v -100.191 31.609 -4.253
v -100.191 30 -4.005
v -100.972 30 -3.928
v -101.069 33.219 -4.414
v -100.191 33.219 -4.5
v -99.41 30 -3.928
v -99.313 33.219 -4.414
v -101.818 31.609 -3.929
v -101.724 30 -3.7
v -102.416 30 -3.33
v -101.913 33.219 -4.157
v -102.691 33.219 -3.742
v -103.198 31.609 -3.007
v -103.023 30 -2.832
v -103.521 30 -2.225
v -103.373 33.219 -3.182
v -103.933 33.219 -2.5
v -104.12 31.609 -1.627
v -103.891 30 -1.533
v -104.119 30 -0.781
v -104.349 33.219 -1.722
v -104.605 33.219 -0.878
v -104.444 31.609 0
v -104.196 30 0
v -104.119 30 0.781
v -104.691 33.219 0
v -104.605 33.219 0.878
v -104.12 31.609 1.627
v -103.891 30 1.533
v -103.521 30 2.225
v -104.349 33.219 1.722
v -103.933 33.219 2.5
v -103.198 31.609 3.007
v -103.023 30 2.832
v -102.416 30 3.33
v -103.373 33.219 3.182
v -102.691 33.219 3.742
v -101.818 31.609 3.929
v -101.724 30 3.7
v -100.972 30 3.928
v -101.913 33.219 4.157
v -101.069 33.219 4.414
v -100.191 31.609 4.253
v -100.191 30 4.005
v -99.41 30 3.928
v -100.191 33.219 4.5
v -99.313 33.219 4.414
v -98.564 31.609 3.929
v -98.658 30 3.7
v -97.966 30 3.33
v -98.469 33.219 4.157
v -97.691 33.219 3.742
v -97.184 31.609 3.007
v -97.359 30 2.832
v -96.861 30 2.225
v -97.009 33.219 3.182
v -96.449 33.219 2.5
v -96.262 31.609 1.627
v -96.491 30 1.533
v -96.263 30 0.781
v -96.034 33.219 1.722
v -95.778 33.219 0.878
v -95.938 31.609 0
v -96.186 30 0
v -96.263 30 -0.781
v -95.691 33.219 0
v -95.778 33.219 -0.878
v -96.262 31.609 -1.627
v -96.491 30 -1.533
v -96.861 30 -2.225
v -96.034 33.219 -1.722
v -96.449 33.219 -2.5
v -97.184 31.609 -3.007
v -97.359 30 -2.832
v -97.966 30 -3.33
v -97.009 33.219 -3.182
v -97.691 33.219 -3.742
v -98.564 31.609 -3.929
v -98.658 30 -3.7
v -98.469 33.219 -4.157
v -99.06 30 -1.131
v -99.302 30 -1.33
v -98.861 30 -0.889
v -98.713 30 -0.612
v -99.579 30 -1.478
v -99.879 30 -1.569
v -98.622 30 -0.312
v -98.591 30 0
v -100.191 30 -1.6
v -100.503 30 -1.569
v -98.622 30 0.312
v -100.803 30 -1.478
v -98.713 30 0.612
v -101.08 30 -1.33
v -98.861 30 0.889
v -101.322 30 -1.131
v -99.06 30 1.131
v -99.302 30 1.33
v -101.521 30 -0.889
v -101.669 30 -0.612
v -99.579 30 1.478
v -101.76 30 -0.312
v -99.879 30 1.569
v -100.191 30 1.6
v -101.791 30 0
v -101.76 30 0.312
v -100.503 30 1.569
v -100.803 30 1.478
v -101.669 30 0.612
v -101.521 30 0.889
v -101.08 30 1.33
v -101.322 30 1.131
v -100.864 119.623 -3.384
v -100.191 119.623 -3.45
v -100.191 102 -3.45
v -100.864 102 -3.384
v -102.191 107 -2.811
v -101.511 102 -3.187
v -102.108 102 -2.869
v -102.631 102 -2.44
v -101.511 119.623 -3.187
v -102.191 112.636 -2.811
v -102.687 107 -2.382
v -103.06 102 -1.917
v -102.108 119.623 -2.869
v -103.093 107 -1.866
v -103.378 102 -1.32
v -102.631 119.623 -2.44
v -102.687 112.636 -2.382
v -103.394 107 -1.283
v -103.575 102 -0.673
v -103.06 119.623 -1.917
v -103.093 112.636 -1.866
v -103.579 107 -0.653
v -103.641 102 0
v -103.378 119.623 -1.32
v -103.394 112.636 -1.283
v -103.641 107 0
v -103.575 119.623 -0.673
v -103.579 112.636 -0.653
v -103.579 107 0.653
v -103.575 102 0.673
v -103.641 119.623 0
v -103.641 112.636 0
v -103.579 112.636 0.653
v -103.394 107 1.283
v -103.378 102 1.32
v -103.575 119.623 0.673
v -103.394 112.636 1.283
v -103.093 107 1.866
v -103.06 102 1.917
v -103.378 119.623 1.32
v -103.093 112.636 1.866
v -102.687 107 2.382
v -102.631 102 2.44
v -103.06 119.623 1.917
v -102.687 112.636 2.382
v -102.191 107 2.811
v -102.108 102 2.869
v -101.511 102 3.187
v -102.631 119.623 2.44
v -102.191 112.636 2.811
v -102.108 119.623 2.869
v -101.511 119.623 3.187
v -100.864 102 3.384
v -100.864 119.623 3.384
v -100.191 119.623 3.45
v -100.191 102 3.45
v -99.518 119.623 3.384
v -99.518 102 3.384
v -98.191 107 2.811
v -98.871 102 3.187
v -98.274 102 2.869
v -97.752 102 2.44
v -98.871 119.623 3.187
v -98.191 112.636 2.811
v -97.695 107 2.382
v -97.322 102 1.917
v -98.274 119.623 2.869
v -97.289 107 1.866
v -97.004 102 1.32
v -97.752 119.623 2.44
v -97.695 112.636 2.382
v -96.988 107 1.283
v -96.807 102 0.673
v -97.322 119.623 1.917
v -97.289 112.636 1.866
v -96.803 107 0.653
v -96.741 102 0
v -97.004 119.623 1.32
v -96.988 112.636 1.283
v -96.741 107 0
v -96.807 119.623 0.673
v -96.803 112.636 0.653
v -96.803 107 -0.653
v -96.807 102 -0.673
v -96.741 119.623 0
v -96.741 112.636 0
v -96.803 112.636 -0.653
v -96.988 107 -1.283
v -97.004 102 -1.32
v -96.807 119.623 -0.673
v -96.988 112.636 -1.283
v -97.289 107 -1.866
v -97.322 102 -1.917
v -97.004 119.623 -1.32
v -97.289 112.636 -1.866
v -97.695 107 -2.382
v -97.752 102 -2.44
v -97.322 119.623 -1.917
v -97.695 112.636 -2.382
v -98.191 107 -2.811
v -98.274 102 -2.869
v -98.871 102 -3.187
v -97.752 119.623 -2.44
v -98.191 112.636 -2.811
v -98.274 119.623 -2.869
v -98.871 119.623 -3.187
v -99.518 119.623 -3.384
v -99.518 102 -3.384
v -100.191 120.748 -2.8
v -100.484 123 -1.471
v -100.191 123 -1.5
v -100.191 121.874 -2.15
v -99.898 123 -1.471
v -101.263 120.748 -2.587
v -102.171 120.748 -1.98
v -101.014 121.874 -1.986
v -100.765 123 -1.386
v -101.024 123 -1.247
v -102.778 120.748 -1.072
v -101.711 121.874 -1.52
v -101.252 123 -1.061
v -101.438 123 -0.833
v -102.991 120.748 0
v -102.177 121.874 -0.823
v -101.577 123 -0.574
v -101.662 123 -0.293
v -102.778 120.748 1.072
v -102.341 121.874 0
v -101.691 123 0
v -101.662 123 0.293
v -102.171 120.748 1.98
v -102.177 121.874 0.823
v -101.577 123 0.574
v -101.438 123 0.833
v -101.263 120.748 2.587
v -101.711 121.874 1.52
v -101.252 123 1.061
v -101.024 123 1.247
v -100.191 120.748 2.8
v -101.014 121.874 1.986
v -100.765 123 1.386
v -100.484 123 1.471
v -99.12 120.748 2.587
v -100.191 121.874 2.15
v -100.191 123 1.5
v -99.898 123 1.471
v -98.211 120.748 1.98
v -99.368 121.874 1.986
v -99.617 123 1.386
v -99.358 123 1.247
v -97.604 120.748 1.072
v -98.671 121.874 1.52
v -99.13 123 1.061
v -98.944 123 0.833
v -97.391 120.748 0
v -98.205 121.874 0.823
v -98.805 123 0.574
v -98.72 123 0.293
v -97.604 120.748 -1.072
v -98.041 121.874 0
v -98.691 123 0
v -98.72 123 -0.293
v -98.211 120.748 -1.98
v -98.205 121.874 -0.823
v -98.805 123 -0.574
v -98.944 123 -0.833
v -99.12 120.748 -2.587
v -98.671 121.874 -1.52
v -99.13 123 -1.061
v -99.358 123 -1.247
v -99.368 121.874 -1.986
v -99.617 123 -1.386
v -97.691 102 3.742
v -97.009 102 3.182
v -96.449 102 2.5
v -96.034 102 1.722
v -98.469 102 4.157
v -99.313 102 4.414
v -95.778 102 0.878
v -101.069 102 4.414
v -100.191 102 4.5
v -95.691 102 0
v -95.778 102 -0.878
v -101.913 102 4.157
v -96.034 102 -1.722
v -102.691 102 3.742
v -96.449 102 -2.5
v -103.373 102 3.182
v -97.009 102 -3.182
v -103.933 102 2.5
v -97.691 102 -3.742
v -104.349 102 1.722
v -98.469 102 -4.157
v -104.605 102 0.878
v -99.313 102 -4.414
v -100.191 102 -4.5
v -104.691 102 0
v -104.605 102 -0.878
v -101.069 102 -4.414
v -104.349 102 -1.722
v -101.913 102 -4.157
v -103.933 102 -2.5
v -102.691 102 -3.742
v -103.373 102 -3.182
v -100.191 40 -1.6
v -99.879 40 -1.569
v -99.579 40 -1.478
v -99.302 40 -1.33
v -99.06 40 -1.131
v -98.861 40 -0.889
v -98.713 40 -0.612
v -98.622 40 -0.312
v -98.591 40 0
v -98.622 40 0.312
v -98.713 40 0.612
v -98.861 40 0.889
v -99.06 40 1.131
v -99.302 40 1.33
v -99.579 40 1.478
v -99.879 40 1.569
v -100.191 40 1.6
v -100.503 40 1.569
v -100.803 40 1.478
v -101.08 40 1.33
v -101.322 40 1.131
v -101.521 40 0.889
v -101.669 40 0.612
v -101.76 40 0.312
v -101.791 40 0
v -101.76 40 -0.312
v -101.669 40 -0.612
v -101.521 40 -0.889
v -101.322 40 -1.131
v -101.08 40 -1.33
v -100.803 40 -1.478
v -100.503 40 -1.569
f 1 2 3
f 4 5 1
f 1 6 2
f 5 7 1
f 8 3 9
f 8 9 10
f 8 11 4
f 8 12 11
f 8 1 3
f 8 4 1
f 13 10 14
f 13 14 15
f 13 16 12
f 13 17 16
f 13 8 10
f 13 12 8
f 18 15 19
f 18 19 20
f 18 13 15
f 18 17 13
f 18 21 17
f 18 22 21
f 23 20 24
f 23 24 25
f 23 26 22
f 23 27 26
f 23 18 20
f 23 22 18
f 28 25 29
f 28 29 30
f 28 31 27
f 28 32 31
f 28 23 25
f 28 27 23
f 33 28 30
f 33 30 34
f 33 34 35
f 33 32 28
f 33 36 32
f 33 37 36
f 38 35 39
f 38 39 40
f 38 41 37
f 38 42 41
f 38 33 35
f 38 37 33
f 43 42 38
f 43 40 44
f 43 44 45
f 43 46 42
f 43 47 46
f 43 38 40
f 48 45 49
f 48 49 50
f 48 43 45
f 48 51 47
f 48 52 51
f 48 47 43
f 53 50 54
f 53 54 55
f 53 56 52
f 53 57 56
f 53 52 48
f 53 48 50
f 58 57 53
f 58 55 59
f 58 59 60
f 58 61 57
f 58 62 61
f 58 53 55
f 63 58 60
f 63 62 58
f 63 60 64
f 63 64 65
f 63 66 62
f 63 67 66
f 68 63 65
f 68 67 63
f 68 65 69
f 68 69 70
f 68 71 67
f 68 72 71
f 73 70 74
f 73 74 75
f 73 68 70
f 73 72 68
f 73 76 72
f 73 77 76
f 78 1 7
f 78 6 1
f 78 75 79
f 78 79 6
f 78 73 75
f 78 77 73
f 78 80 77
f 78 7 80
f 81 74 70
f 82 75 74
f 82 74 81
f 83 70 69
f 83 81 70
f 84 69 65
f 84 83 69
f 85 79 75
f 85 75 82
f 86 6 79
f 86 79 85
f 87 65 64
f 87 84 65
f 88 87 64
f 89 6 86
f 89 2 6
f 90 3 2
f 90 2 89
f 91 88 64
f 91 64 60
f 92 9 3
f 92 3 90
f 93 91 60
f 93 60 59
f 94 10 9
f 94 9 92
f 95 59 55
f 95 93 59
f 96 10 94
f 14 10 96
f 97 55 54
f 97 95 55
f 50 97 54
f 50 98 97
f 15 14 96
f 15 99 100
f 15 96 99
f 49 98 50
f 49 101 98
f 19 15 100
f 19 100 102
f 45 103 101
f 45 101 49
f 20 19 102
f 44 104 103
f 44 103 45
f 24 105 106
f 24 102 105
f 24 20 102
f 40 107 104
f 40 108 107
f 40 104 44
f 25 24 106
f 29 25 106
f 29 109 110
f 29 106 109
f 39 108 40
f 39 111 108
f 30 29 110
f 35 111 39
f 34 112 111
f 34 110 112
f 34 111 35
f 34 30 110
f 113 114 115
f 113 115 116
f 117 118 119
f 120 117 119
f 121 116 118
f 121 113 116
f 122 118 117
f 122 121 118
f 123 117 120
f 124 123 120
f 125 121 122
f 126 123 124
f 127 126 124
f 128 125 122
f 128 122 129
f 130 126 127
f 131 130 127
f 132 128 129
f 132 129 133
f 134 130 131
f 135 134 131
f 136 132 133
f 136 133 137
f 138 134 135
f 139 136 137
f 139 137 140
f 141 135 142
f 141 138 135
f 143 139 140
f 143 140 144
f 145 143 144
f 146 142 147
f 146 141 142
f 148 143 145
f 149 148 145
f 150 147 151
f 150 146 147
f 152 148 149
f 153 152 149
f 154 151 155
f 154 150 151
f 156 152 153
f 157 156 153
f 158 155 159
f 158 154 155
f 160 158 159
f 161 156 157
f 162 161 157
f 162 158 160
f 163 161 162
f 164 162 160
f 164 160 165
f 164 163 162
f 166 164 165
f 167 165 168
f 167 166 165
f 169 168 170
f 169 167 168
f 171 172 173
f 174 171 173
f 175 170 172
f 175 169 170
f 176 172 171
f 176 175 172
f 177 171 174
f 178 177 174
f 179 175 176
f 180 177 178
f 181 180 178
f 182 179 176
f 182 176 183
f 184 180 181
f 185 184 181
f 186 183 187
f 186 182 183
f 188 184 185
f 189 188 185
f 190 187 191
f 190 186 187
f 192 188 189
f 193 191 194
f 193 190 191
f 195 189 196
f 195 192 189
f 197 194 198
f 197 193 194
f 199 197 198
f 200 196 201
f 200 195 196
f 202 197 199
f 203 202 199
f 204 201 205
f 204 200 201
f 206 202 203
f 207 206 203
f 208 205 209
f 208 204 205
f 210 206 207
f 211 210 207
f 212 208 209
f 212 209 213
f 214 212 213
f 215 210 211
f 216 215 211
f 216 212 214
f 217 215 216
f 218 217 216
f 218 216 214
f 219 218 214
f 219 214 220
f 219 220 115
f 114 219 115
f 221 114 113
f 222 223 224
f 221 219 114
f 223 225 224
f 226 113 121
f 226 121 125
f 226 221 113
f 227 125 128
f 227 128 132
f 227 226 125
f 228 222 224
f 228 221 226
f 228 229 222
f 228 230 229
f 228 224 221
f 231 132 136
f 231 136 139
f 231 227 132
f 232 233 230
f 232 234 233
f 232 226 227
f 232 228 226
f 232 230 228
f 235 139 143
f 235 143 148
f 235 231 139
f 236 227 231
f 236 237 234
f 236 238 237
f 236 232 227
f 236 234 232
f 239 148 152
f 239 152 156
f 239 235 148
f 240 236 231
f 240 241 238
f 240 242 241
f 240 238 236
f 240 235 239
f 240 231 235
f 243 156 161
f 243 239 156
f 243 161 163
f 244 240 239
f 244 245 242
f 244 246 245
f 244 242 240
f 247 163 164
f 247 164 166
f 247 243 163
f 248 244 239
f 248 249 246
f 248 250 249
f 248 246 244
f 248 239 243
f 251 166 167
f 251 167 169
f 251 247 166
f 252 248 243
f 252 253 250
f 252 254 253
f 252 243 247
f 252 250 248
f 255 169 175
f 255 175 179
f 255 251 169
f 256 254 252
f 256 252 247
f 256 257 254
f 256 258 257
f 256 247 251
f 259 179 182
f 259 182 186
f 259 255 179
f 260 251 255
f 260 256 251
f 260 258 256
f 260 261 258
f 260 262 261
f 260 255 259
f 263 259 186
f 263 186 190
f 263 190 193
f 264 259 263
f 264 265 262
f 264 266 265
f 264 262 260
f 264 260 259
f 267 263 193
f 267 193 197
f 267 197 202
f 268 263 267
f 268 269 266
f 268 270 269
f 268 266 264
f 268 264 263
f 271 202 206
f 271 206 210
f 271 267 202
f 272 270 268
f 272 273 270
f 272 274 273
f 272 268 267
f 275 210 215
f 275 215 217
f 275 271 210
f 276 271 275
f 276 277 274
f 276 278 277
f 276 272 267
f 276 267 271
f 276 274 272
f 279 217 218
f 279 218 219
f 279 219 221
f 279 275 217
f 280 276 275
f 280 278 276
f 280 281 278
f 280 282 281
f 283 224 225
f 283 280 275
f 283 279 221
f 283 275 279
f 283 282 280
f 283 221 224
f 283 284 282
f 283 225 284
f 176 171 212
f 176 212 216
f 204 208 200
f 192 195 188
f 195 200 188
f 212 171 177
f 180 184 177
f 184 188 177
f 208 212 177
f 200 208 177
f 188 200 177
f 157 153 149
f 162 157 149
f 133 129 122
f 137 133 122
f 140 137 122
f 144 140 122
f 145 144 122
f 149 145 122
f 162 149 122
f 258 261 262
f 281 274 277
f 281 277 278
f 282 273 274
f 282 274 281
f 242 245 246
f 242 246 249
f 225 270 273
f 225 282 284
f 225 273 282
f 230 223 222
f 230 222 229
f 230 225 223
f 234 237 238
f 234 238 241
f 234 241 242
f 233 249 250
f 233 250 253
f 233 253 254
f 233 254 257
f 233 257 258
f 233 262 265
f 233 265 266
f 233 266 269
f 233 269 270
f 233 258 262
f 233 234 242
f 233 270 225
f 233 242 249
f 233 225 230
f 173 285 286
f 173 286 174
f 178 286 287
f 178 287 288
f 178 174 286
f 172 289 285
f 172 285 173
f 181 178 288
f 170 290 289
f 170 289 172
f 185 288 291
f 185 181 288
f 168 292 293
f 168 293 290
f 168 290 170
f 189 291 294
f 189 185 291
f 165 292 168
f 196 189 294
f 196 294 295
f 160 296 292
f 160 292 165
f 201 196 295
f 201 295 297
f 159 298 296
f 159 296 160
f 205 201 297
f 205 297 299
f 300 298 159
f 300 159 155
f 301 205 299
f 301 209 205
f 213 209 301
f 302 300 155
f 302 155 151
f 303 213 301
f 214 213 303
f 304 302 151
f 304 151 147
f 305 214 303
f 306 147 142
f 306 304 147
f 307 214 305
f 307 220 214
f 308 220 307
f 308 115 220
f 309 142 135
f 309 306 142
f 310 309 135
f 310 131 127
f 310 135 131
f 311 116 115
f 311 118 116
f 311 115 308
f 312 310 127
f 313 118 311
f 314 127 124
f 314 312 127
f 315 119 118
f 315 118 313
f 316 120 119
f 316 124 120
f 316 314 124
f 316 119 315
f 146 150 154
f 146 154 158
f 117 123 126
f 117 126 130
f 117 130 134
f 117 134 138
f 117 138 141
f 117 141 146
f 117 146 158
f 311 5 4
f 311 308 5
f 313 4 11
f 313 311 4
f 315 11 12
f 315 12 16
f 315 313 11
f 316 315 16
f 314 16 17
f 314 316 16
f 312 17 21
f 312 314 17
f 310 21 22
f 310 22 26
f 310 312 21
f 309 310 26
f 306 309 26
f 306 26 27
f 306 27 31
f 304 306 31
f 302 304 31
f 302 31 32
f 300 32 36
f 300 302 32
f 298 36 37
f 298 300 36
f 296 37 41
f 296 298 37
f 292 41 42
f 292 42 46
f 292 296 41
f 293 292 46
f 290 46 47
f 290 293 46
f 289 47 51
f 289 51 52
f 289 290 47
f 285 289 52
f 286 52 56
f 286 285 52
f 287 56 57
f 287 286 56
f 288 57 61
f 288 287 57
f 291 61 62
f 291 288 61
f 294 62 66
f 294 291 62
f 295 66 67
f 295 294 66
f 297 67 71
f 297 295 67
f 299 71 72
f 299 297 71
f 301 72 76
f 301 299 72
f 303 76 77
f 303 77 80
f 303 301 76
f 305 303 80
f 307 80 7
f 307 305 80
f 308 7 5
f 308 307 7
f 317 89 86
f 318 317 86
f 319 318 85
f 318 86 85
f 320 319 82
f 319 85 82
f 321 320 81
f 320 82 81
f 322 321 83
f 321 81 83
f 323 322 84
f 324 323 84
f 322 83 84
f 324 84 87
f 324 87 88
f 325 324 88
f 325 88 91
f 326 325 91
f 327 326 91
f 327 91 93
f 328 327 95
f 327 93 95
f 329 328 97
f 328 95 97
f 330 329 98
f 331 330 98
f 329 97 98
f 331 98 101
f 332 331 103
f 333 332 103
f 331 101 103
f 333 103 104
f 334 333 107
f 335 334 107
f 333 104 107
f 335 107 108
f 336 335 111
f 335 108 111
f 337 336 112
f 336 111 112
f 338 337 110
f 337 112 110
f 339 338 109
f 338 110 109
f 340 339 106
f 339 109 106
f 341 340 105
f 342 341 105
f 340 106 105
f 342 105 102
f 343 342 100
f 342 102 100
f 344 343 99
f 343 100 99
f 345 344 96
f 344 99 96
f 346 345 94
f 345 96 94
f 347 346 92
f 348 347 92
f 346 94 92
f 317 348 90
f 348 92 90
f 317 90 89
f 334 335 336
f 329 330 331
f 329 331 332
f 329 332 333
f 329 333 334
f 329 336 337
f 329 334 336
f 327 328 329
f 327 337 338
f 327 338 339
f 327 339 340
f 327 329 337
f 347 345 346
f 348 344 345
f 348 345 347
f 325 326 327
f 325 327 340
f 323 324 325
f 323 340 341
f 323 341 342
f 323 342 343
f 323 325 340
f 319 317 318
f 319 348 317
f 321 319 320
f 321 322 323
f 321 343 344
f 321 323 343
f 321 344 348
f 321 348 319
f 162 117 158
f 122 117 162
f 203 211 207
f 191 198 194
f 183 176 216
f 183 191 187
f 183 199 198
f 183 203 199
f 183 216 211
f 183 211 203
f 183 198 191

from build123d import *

# Parameters (mm, degrees)
ESQUISSE4_R             = 1.6
ENL_V_MAT_EXTRU_1_DEPTH = 10
ESQUISSE6_W             = 2.893423418
ESQUISSE6_H             = 5.635783234
ENL_V_MAT_EXTRU_3_DEPTH = 5.5


with BuildPart() as part:
    # Esquisse2 → Révolution1 (revolve)
    with BuildSketch(Plane.XY, mode=Mode.PRIVATE) as r_volution1_sk:
        Polygon((-100.191044353, 30), (-104.196152423, 30), (-104.691044353, 33.218828512), (-104.691044353, 102), (-103.641044353, 102), (-103.641044353, 119.622500925), (-101.691044353, 123), (-100.191044353, 123), align=None)
    revolve(r_volution1_sk.sketch.rotate(Axis((-100.191044353, 30, 0), (0, 1, 0)), 270), axis=Axis((-100.191044353, 30, 0), (0, 1, 0)))

    # Esquisse4 → Enlèv. mat.-Extru.1 (cut)
    with BuildSketch(Plane.XZ.offset(-30)):
        with Locations(Location((-100.191044353, 0, 0), (0, 0, 270))):
            Circle(ESQUISSE4_R)
    extrude(amount=-ENL_V_MAT_EXTRU_1_DEPTH, mode=Mode.SUBTRACT)

    # Esquisse6 → Enlèv. mat.-Extru.3 (cut, symmetric)
    with BuildSketch(Plane.XY):
        with Locations((-103.637756062, 109.817891617)):
            Rectangle(ESQUISSE6_W, ESQUISSE6_H)
        with Locations((-96.744332644, 109.817891617)):
            Rectangle(ESQUISSE6_W, ESQUISSE6_H)
    extrude(amount=ENL_V_MAT_EXTRU_3_DEPTH, both=True, mode=Mode.SUBTRACT)


solid = part.part
